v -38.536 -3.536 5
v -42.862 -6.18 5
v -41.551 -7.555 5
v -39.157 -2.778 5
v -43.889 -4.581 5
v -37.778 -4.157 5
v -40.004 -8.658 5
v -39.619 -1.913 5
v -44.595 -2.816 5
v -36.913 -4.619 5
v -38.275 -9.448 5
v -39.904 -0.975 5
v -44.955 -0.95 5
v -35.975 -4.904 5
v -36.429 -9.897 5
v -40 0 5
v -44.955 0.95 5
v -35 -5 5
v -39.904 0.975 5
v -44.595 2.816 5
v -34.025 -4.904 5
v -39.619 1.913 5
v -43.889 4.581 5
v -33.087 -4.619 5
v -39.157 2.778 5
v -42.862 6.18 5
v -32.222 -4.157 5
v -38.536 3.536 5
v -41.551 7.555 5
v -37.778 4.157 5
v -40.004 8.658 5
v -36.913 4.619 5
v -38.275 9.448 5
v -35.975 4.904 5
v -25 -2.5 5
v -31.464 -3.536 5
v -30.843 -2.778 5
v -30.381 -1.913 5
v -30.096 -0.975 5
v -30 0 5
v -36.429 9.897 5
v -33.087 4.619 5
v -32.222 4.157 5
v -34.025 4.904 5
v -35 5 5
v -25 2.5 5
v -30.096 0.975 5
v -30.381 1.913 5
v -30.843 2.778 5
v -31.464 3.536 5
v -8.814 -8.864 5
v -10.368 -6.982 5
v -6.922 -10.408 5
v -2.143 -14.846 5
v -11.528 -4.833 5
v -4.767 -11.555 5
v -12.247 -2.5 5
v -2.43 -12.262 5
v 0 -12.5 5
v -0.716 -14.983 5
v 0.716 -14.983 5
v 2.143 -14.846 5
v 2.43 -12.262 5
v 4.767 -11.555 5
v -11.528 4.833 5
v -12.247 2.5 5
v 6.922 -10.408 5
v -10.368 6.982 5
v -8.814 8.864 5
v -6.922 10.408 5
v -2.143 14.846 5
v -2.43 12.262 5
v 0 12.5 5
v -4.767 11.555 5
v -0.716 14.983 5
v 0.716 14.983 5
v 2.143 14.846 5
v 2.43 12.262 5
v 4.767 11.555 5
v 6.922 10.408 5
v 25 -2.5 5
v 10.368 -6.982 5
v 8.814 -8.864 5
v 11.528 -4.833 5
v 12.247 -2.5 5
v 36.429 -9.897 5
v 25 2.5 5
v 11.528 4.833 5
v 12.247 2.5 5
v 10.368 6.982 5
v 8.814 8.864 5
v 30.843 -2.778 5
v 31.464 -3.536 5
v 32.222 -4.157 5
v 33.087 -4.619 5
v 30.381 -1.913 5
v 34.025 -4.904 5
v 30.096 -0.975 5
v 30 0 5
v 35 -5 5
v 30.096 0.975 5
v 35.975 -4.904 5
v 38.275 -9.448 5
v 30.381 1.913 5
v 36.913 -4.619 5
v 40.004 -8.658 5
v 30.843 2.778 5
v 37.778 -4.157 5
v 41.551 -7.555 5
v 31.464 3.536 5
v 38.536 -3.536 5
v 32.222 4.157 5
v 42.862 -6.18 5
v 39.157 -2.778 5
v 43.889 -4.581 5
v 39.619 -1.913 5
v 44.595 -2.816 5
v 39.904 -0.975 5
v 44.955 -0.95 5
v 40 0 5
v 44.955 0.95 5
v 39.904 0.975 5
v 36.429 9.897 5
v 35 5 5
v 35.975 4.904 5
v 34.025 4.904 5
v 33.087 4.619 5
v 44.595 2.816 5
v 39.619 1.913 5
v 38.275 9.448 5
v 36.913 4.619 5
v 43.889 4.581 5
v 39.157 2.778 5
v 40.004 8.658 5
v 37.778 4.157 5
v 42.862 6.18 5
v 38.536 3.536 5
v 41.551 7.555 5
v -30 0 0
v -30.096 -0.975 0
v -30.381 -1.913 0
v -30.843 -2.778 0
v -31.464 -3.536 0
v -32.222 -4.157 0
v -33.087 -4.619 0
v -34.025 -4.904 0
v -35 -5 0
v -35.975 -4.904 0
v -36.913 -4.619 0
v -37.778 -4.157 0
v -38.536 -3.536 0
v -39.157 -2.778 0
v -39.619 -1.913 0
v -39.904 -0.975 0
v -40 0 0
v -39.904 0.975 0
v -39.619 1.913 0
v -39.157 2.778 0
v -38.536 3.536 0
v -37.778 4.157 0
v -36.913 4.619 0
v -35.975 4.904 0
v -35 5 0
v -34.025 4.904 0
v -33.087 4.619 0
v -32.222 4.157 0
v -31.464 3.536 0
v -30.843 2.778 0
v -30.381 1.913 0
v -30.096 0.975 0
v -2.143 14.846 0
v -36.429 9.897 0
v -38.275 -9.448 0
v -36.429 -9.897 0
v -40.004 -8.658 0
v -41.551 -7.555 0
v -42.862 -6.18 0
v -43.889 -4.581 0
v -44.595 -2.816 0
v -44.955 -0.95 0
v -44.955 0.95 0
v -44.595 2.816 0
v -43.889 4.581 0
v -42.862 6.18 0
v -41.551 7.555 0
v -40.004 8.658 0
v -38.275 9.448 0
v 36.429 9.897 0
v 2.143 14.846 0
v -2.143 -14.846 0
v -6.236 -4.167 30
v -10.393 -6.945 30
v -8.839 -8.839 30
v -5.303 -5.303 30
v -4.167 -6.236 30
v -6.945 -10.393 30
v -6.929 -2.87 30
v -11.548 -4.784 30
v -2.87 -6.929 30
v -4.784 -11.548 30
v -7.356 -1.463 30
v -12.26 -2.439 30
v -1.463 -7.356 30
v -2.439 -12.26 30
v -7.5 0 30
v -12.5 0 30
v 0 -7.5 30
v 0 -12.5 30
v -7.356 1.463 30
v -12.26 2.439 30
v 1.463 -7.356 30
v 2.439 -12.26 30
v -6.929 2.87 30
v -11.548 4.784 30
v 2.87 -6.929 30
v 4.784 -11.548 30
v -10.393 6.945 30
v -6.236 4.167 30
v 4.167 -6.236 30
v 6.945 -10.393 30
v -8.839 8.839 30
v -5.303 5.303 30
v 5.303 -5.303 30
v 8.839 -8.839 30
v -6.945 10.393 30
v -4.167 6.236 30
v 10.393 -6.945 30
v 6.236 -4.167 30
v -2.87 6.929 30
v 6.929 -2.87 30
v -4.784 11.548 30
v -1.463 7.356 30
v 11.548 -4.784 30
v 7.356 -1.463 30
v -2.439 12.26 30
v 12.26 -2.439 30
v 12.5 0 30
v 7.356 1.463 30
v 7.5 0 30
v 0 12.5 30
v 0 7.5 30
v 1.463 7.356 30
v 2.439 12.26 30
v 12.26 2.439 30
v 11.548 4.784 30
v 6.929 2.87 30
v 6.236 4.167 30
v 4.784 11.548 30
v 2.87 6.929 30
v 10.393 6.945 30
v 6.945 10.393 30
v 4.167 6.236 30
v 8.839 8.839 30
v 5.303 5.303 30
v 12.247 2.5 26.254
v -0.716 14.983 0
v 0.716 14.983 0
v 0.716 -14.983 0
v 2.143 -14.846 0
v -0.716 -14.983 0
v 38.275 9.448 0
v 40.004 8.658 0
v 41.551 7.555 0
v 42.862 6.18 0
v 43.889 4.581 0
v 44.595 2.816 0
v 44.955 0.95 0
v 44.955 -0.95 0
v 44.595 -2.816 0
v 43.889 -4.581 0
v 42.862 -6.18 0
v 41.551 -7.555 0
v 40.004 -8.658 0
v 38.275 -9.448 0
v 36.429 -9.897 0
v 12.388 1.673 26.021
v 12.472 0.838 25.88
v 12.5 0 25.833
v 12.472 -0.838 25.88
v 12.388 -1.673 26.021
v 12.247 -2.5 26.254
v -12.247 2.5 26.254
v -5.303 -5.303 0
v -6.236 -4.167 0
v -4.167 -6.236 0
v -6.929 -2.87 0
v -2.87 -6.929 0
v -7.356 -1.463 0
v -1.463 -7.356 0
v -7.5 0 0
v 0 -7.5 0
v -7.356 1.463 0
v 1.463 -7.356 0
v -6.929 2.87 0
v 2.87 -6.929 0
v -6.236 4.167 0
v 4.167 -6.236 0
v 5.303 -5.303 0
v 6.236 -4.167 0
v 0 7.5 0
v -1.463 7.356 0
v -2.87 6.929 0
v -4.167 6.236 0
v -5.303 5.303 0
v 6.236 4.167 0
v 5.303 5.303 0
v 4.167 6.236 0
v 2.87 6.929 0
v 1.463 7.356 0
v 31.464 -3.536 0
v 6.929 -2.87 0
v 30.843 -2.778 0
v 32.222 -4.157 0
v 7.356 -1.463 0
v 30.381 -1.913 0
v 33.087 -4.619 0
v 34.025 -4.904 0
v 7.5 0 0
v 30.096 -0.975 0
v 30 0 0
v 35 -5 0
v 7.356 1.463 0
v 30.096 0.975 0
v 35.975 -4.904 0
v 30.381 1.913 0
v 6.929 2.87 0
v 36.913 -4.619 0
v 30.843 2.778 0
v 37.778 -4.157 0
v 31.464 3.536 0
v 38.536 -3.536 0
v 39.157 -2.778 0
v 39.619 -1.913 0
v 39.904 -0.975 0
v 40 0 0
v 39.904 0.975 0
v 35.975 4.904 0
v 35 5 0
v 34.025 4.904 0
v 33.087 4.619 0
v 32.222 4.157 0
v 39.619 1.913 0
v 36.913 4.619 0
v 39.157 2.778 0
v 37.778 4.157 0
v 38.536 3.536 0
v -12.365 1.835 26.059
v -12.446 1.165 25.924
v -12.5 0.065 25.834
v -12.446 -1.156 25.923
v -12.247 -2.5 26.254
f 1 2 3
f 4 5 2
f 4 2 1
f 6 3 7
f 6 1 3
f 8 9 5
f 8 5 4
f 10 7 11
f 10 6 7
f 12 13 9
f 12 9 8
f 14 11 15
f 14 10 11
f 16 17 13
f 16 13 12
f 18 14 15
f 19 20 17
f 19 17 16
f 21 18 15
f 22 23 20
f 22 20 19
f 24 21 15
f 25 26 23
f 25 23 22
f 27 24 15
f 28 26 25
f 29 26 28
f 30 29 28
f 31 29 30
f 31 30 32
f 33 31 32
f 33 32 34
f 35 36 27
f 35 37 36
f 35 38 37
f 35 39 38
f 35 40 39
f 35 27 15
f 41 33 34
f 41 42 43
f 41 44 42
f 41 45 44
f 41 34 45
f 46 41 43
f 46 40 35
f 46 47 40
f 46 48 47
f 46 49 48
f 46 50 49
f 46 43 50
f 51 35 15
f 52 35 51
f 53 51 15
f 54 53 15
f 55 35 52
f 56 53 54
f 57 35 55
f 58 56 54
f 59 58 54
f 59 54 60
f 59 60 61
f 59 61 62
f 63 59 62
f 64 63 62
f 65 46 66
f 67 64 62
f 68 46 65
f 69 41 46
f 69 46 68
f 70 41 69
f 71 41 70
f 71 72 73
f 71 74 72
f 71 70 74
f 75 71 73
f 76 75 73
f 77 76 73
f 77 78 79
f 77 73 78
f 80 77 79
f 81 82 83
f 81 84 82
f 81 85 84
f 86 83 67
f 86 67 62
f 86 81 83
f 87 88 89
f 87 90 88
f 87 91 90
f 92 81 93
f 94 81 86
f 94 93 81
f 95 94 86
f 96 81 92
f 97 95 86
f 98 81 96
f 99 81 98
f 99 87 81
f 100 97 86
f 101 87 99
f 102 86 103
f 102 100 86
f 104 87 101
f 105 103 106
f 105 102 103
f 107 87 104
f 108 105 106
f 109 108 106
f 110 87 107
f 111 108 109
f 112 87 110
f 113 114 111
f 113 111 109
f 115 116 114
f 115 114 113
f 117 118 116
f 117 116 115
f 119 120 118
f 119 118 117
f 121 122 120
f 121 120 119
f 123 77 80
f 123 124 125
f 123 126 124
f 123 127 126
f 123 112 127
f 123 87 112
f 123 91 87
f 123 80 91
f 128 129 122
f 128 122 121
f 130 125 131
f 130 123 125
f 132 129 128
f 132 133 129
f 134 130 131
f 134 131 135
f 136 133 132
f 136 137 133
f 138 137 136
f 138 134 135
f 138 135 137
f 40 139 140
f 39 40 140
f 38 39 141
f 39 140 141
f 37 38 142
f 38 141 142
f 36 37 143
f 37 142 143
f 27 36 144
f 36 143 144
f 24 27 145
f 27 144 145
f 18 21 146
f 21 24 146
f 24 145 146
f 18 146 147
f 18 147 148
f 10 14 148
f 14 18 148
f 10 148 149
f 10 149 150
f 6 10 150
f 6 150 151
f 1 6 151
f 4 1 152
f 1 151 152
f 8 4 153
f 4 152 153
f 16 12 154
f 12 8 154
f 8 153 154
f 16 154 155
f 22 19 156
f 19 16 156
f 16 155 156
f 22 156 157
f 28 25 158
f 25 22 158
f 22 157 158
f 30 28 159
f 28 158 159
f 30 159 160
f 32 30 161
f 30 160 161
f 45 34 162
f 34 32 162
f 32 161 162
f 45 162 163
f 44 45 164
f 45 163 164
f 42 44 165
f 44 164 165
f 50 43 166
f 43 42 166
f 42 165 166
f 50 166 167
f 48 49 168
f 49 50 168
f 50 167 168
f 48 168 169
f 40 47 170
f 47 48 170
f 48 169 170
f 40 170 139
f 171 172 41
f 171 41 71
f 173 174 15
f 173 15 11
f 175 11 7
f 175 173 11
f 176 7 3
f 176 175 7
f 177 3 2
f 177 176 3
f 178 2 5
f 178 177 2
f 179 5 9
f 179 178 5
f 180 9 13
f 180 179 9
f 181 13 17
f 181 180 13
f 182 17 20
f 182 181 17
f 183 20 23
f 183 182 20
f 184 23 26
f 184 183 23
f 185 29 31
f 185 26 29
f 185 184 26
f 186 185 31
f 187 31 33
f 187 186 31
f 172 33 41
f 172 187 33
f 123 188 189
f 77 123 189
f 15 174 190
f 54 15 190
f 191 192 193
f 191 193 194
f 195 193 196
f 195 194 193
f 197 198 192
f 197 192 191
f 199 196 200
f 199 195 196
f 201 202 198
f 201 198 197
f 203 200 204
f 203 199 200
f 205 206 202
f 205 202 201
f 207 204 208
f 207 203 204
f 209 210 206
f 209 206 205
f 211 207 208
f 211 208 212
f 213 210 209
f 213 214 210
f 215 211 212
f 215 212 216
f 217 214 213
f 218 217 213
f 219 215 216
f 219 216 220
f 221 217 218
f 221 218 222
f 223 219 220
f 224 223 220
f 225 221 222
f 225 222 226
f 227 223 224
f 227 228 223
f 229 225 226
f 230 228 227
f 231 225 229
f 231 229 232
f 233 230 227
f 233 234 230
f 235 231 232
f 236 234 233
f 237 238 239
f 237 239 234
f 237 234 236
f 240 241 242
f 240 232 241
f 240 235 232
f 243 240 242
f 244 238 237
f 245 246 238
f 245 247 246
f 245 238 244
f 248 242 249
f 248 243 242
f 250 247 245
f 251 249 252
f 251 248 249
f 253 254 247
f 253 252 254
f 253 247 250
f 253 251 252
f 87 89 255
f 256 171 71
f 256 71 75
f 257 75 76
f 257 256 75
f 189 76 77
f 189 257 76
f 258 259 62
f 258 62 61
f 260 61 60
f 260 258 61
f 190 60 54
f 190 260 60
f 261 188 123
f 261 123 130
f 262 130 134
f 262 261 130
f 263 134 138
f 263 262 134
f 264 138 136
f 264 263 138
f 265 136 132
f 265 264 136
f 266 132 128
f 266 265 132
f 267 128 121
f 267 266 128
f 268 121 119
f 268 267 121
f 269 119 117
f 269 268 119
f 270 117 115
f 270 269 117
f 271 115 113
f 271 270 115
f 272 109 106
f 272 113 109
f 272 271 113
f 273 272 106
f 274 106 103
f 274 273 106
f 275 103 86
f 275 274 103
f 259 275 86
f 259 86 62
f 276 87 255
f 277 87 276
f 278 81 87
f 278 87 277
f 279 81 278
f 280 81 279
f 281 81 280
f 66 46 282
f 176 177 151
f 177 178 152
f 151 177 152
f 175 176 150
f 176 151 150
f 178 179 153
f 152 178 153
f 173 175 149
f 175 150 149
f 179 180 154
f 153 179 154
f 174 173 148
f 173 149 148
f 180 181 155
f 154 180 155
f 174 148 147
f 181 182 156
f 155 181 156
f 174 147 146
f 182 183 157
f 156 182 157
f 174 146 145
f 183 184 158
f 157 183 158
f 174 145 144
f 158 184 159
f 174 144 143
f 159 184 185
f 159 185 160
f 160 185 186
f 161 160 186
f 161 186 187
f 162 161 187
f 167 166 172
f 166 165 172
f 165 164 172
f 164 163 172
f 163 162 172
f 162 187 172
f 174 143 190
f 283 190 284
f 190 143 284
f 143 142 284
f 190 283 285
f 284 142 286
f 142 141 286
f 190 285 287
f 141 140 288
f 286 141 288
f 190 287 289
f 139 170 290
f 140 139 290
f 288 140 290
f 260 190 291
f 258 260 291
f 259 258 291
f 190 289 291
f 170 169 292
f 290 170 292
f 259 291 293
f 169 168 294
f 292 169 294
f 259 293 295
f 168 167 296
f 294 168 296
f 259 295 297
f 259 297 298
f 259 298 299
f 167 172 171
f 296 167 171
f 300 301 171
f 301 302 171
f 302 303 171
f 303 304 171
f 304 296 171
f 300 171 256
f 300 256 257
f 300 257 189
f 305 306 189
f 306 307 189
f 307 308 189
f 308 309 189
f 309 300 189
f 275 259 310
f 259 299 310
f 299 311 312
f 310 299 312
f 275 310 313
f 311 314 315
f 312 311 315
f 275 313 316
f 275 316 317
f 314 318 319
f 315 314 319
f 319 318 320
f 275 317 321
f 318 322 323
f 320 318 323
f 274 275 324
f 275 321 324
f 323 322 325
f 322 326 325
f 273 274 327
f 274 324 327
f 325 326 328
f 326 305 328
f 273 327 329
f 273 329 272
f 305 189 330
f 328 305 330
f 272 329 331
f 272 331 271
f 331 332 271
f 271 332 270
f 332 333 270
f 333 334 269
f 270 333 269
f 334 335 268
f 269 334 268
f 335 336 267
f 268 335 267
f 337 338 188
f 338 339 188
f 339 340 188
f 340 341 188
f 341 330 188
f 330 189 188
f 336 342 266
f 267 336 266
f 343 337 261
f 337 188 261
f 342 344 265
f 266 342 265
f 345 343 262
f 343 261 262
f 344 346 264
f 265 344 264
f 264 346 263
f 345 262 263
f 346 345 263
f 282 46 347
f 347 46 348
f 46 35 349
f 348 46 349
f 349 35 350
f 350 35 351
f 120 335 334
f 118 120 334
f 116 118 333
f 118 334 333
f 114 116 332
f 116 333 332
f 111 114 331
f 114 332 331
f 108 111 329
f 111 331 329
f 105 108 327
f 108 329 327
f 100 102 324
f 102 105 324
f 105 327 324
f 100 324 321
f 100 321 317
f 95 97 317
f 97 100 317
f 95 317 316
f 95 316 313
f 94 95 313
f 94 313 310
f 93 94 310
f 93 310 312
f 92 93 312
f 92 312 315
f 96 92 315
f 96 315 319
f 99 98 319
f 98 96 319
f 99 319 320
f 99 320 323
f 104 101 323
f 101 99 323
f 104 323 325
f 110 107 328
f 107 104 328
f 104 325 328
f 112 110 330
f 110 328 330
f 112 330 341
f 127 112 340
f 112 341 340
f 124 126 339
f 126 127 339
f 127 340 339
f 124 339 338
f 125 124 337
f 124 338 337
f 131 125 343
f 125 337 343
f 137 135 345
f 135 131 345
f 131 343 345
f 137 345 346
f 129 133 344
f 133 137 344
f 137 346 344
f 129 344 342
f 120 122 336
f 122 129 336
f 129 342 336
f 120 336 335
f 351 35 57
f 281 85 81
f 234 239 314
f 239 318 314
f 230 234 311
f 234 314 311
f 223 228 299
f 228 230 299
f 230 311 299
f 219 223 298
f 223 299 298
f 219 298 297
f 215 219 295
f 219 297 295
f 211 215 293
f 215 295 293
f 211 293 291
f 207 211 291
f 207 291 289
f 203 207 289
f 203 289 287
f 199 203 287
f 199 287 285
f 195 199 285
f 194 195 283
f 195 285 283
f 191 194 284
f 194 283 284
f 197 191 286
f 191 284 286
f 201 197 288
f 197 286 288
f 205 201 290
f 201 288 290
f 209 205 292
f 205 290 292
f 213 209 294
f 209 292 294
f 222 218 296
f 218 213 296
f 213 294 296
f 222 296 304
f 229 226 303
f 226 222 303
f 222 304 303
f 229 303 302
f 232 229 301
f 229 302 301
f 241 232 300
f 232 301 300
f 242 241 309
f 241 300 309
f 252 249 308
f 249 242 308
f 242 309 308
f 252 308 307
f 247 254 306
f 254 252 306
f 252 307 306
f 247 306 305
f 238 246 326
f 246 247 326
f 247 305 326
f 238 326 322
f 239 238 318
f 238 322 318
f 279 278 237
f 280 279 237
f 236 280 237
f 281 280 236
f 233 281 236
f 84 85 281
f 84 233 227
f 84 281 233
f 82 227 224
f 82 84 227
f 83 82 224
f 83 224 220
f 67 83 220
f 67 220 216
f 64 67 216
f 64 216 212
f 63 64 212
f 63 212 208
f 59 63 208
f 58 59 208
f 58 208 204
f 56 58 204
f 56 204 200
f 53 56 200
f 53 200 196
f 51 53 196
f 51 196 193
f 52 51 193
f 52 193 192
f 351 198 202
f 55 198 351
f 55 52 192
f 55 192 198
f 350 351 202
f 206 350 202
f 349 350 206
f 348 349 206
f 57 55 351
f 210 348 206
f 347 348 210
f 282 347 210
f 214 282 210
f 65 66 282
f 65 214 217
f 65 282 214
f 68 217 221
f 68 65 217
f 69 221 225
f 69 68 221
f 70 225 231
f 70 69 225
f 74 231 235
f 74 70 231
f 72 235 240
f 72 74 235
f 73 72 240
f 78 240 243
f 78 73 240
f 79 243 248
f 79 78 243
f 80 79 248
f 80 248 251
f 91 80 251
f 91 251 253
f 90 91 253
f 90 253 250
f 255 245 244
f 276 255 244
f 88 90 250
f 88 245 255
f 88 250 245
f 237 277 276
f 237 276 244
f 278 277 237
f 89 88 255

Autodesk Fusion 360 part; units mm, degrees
sketch "Sketch1" plane through (0, 0, 0) normal (0, 0, 1) x (1, 0, 0)
  circle A0 centre (0, 0) radius 12.5
  circle A1 centre (0, 0) radius 7.5
  circle A2 centre (-35, 0) radius 5
  circle A3 centre (35, 0) radius 5
  line L0 (-60, 0) -> (60, 0) construction
  line L1 (-35, 0) -> (-35, 14) construction
  line L2 (-35, 14) -> (-35, -13) construction
  line L3 (35, 0) -> (35, 14) construction
  line L4 (35, 14) -> (35, -13) construction
  line L5 (-36.4286, -9.8974) -> (-2.1429, -14.8461)
  line L6 (36.4286, -9.8974) -> (2.1429, -14.8461)
  line L7 (36.4286, 9.8974) -> (2.1429, 14.8461)
  line L8 (-36.4286, 9.8974) -> (-2.1429, 14.8461)
  arc A4 (-35, 10) -> (-35, -10) centre (-35, 0) ccw
  arc A5 (35, -10) -> (35, 10) centre (35, 0) ccw
  arc A6 (-2.1429, -14.8461) -> (2.1429, -14.8461) centre (0, 0) ccw
  arc A7 (2.1429, 14.8461) -> (-2.1429, 14.8461) centre (0, 0) ccw
  dimension "d1" = 30
  dimension "d2" = 25
  dimension "d3" = 15
  dimension "d4" = 10
  dimension "d5" = 10
  dimension "d6" = 20
  dimension "d7" = 20
  dimension "d8" = 35
  dimension "d9" = 35
extrude "Extrude1" add sketch "Sketch1" along normal blind 5 contours L5 L6 L7 L8 A4 A5 A6 A7
sketch "Sketch2" plane through (0, 0, 0) normal (0, 0, 1) x (1, 0, 0)
  circle A0 centre (0, 0) radius 12.5
  circle A1 centre (0, 0) radius 7.5
  dimension "d12" = 25
  dimension "d13" = 15
extrude "Extrude2" add sketch "Sketch2" along normal blind 30
sketch "Sketch6" plane through (0, 0, 0) normal (0, 1, 0) x (1, 0, 0)
  line L0 (-10, -5) -> (-25, -5)
  line L1 (-25, -5) -> (-10, -30)
  line L2 (-10, -30) -> (-10, -5)
  line L3 (10, -5) -> (25, -5)
  line L4 (25, -5) -> (10, -30)
  line L5 (10, -30) -> (10, -5)
  line L6 (-36.4286, -5) -> (-2.1429, -5)
  line L7 (2.1429, -5) -> (36.4286, -5)
  dimension "d27" = 10
  dimension "d28" = 10
  dimension "d29" = 15
  dimension "d30" = 15
  dimension "d31" = 25
extrude "Extrude4" add sketch "Sketch6" along normal blind 2.5 and the other way blind 2.5
